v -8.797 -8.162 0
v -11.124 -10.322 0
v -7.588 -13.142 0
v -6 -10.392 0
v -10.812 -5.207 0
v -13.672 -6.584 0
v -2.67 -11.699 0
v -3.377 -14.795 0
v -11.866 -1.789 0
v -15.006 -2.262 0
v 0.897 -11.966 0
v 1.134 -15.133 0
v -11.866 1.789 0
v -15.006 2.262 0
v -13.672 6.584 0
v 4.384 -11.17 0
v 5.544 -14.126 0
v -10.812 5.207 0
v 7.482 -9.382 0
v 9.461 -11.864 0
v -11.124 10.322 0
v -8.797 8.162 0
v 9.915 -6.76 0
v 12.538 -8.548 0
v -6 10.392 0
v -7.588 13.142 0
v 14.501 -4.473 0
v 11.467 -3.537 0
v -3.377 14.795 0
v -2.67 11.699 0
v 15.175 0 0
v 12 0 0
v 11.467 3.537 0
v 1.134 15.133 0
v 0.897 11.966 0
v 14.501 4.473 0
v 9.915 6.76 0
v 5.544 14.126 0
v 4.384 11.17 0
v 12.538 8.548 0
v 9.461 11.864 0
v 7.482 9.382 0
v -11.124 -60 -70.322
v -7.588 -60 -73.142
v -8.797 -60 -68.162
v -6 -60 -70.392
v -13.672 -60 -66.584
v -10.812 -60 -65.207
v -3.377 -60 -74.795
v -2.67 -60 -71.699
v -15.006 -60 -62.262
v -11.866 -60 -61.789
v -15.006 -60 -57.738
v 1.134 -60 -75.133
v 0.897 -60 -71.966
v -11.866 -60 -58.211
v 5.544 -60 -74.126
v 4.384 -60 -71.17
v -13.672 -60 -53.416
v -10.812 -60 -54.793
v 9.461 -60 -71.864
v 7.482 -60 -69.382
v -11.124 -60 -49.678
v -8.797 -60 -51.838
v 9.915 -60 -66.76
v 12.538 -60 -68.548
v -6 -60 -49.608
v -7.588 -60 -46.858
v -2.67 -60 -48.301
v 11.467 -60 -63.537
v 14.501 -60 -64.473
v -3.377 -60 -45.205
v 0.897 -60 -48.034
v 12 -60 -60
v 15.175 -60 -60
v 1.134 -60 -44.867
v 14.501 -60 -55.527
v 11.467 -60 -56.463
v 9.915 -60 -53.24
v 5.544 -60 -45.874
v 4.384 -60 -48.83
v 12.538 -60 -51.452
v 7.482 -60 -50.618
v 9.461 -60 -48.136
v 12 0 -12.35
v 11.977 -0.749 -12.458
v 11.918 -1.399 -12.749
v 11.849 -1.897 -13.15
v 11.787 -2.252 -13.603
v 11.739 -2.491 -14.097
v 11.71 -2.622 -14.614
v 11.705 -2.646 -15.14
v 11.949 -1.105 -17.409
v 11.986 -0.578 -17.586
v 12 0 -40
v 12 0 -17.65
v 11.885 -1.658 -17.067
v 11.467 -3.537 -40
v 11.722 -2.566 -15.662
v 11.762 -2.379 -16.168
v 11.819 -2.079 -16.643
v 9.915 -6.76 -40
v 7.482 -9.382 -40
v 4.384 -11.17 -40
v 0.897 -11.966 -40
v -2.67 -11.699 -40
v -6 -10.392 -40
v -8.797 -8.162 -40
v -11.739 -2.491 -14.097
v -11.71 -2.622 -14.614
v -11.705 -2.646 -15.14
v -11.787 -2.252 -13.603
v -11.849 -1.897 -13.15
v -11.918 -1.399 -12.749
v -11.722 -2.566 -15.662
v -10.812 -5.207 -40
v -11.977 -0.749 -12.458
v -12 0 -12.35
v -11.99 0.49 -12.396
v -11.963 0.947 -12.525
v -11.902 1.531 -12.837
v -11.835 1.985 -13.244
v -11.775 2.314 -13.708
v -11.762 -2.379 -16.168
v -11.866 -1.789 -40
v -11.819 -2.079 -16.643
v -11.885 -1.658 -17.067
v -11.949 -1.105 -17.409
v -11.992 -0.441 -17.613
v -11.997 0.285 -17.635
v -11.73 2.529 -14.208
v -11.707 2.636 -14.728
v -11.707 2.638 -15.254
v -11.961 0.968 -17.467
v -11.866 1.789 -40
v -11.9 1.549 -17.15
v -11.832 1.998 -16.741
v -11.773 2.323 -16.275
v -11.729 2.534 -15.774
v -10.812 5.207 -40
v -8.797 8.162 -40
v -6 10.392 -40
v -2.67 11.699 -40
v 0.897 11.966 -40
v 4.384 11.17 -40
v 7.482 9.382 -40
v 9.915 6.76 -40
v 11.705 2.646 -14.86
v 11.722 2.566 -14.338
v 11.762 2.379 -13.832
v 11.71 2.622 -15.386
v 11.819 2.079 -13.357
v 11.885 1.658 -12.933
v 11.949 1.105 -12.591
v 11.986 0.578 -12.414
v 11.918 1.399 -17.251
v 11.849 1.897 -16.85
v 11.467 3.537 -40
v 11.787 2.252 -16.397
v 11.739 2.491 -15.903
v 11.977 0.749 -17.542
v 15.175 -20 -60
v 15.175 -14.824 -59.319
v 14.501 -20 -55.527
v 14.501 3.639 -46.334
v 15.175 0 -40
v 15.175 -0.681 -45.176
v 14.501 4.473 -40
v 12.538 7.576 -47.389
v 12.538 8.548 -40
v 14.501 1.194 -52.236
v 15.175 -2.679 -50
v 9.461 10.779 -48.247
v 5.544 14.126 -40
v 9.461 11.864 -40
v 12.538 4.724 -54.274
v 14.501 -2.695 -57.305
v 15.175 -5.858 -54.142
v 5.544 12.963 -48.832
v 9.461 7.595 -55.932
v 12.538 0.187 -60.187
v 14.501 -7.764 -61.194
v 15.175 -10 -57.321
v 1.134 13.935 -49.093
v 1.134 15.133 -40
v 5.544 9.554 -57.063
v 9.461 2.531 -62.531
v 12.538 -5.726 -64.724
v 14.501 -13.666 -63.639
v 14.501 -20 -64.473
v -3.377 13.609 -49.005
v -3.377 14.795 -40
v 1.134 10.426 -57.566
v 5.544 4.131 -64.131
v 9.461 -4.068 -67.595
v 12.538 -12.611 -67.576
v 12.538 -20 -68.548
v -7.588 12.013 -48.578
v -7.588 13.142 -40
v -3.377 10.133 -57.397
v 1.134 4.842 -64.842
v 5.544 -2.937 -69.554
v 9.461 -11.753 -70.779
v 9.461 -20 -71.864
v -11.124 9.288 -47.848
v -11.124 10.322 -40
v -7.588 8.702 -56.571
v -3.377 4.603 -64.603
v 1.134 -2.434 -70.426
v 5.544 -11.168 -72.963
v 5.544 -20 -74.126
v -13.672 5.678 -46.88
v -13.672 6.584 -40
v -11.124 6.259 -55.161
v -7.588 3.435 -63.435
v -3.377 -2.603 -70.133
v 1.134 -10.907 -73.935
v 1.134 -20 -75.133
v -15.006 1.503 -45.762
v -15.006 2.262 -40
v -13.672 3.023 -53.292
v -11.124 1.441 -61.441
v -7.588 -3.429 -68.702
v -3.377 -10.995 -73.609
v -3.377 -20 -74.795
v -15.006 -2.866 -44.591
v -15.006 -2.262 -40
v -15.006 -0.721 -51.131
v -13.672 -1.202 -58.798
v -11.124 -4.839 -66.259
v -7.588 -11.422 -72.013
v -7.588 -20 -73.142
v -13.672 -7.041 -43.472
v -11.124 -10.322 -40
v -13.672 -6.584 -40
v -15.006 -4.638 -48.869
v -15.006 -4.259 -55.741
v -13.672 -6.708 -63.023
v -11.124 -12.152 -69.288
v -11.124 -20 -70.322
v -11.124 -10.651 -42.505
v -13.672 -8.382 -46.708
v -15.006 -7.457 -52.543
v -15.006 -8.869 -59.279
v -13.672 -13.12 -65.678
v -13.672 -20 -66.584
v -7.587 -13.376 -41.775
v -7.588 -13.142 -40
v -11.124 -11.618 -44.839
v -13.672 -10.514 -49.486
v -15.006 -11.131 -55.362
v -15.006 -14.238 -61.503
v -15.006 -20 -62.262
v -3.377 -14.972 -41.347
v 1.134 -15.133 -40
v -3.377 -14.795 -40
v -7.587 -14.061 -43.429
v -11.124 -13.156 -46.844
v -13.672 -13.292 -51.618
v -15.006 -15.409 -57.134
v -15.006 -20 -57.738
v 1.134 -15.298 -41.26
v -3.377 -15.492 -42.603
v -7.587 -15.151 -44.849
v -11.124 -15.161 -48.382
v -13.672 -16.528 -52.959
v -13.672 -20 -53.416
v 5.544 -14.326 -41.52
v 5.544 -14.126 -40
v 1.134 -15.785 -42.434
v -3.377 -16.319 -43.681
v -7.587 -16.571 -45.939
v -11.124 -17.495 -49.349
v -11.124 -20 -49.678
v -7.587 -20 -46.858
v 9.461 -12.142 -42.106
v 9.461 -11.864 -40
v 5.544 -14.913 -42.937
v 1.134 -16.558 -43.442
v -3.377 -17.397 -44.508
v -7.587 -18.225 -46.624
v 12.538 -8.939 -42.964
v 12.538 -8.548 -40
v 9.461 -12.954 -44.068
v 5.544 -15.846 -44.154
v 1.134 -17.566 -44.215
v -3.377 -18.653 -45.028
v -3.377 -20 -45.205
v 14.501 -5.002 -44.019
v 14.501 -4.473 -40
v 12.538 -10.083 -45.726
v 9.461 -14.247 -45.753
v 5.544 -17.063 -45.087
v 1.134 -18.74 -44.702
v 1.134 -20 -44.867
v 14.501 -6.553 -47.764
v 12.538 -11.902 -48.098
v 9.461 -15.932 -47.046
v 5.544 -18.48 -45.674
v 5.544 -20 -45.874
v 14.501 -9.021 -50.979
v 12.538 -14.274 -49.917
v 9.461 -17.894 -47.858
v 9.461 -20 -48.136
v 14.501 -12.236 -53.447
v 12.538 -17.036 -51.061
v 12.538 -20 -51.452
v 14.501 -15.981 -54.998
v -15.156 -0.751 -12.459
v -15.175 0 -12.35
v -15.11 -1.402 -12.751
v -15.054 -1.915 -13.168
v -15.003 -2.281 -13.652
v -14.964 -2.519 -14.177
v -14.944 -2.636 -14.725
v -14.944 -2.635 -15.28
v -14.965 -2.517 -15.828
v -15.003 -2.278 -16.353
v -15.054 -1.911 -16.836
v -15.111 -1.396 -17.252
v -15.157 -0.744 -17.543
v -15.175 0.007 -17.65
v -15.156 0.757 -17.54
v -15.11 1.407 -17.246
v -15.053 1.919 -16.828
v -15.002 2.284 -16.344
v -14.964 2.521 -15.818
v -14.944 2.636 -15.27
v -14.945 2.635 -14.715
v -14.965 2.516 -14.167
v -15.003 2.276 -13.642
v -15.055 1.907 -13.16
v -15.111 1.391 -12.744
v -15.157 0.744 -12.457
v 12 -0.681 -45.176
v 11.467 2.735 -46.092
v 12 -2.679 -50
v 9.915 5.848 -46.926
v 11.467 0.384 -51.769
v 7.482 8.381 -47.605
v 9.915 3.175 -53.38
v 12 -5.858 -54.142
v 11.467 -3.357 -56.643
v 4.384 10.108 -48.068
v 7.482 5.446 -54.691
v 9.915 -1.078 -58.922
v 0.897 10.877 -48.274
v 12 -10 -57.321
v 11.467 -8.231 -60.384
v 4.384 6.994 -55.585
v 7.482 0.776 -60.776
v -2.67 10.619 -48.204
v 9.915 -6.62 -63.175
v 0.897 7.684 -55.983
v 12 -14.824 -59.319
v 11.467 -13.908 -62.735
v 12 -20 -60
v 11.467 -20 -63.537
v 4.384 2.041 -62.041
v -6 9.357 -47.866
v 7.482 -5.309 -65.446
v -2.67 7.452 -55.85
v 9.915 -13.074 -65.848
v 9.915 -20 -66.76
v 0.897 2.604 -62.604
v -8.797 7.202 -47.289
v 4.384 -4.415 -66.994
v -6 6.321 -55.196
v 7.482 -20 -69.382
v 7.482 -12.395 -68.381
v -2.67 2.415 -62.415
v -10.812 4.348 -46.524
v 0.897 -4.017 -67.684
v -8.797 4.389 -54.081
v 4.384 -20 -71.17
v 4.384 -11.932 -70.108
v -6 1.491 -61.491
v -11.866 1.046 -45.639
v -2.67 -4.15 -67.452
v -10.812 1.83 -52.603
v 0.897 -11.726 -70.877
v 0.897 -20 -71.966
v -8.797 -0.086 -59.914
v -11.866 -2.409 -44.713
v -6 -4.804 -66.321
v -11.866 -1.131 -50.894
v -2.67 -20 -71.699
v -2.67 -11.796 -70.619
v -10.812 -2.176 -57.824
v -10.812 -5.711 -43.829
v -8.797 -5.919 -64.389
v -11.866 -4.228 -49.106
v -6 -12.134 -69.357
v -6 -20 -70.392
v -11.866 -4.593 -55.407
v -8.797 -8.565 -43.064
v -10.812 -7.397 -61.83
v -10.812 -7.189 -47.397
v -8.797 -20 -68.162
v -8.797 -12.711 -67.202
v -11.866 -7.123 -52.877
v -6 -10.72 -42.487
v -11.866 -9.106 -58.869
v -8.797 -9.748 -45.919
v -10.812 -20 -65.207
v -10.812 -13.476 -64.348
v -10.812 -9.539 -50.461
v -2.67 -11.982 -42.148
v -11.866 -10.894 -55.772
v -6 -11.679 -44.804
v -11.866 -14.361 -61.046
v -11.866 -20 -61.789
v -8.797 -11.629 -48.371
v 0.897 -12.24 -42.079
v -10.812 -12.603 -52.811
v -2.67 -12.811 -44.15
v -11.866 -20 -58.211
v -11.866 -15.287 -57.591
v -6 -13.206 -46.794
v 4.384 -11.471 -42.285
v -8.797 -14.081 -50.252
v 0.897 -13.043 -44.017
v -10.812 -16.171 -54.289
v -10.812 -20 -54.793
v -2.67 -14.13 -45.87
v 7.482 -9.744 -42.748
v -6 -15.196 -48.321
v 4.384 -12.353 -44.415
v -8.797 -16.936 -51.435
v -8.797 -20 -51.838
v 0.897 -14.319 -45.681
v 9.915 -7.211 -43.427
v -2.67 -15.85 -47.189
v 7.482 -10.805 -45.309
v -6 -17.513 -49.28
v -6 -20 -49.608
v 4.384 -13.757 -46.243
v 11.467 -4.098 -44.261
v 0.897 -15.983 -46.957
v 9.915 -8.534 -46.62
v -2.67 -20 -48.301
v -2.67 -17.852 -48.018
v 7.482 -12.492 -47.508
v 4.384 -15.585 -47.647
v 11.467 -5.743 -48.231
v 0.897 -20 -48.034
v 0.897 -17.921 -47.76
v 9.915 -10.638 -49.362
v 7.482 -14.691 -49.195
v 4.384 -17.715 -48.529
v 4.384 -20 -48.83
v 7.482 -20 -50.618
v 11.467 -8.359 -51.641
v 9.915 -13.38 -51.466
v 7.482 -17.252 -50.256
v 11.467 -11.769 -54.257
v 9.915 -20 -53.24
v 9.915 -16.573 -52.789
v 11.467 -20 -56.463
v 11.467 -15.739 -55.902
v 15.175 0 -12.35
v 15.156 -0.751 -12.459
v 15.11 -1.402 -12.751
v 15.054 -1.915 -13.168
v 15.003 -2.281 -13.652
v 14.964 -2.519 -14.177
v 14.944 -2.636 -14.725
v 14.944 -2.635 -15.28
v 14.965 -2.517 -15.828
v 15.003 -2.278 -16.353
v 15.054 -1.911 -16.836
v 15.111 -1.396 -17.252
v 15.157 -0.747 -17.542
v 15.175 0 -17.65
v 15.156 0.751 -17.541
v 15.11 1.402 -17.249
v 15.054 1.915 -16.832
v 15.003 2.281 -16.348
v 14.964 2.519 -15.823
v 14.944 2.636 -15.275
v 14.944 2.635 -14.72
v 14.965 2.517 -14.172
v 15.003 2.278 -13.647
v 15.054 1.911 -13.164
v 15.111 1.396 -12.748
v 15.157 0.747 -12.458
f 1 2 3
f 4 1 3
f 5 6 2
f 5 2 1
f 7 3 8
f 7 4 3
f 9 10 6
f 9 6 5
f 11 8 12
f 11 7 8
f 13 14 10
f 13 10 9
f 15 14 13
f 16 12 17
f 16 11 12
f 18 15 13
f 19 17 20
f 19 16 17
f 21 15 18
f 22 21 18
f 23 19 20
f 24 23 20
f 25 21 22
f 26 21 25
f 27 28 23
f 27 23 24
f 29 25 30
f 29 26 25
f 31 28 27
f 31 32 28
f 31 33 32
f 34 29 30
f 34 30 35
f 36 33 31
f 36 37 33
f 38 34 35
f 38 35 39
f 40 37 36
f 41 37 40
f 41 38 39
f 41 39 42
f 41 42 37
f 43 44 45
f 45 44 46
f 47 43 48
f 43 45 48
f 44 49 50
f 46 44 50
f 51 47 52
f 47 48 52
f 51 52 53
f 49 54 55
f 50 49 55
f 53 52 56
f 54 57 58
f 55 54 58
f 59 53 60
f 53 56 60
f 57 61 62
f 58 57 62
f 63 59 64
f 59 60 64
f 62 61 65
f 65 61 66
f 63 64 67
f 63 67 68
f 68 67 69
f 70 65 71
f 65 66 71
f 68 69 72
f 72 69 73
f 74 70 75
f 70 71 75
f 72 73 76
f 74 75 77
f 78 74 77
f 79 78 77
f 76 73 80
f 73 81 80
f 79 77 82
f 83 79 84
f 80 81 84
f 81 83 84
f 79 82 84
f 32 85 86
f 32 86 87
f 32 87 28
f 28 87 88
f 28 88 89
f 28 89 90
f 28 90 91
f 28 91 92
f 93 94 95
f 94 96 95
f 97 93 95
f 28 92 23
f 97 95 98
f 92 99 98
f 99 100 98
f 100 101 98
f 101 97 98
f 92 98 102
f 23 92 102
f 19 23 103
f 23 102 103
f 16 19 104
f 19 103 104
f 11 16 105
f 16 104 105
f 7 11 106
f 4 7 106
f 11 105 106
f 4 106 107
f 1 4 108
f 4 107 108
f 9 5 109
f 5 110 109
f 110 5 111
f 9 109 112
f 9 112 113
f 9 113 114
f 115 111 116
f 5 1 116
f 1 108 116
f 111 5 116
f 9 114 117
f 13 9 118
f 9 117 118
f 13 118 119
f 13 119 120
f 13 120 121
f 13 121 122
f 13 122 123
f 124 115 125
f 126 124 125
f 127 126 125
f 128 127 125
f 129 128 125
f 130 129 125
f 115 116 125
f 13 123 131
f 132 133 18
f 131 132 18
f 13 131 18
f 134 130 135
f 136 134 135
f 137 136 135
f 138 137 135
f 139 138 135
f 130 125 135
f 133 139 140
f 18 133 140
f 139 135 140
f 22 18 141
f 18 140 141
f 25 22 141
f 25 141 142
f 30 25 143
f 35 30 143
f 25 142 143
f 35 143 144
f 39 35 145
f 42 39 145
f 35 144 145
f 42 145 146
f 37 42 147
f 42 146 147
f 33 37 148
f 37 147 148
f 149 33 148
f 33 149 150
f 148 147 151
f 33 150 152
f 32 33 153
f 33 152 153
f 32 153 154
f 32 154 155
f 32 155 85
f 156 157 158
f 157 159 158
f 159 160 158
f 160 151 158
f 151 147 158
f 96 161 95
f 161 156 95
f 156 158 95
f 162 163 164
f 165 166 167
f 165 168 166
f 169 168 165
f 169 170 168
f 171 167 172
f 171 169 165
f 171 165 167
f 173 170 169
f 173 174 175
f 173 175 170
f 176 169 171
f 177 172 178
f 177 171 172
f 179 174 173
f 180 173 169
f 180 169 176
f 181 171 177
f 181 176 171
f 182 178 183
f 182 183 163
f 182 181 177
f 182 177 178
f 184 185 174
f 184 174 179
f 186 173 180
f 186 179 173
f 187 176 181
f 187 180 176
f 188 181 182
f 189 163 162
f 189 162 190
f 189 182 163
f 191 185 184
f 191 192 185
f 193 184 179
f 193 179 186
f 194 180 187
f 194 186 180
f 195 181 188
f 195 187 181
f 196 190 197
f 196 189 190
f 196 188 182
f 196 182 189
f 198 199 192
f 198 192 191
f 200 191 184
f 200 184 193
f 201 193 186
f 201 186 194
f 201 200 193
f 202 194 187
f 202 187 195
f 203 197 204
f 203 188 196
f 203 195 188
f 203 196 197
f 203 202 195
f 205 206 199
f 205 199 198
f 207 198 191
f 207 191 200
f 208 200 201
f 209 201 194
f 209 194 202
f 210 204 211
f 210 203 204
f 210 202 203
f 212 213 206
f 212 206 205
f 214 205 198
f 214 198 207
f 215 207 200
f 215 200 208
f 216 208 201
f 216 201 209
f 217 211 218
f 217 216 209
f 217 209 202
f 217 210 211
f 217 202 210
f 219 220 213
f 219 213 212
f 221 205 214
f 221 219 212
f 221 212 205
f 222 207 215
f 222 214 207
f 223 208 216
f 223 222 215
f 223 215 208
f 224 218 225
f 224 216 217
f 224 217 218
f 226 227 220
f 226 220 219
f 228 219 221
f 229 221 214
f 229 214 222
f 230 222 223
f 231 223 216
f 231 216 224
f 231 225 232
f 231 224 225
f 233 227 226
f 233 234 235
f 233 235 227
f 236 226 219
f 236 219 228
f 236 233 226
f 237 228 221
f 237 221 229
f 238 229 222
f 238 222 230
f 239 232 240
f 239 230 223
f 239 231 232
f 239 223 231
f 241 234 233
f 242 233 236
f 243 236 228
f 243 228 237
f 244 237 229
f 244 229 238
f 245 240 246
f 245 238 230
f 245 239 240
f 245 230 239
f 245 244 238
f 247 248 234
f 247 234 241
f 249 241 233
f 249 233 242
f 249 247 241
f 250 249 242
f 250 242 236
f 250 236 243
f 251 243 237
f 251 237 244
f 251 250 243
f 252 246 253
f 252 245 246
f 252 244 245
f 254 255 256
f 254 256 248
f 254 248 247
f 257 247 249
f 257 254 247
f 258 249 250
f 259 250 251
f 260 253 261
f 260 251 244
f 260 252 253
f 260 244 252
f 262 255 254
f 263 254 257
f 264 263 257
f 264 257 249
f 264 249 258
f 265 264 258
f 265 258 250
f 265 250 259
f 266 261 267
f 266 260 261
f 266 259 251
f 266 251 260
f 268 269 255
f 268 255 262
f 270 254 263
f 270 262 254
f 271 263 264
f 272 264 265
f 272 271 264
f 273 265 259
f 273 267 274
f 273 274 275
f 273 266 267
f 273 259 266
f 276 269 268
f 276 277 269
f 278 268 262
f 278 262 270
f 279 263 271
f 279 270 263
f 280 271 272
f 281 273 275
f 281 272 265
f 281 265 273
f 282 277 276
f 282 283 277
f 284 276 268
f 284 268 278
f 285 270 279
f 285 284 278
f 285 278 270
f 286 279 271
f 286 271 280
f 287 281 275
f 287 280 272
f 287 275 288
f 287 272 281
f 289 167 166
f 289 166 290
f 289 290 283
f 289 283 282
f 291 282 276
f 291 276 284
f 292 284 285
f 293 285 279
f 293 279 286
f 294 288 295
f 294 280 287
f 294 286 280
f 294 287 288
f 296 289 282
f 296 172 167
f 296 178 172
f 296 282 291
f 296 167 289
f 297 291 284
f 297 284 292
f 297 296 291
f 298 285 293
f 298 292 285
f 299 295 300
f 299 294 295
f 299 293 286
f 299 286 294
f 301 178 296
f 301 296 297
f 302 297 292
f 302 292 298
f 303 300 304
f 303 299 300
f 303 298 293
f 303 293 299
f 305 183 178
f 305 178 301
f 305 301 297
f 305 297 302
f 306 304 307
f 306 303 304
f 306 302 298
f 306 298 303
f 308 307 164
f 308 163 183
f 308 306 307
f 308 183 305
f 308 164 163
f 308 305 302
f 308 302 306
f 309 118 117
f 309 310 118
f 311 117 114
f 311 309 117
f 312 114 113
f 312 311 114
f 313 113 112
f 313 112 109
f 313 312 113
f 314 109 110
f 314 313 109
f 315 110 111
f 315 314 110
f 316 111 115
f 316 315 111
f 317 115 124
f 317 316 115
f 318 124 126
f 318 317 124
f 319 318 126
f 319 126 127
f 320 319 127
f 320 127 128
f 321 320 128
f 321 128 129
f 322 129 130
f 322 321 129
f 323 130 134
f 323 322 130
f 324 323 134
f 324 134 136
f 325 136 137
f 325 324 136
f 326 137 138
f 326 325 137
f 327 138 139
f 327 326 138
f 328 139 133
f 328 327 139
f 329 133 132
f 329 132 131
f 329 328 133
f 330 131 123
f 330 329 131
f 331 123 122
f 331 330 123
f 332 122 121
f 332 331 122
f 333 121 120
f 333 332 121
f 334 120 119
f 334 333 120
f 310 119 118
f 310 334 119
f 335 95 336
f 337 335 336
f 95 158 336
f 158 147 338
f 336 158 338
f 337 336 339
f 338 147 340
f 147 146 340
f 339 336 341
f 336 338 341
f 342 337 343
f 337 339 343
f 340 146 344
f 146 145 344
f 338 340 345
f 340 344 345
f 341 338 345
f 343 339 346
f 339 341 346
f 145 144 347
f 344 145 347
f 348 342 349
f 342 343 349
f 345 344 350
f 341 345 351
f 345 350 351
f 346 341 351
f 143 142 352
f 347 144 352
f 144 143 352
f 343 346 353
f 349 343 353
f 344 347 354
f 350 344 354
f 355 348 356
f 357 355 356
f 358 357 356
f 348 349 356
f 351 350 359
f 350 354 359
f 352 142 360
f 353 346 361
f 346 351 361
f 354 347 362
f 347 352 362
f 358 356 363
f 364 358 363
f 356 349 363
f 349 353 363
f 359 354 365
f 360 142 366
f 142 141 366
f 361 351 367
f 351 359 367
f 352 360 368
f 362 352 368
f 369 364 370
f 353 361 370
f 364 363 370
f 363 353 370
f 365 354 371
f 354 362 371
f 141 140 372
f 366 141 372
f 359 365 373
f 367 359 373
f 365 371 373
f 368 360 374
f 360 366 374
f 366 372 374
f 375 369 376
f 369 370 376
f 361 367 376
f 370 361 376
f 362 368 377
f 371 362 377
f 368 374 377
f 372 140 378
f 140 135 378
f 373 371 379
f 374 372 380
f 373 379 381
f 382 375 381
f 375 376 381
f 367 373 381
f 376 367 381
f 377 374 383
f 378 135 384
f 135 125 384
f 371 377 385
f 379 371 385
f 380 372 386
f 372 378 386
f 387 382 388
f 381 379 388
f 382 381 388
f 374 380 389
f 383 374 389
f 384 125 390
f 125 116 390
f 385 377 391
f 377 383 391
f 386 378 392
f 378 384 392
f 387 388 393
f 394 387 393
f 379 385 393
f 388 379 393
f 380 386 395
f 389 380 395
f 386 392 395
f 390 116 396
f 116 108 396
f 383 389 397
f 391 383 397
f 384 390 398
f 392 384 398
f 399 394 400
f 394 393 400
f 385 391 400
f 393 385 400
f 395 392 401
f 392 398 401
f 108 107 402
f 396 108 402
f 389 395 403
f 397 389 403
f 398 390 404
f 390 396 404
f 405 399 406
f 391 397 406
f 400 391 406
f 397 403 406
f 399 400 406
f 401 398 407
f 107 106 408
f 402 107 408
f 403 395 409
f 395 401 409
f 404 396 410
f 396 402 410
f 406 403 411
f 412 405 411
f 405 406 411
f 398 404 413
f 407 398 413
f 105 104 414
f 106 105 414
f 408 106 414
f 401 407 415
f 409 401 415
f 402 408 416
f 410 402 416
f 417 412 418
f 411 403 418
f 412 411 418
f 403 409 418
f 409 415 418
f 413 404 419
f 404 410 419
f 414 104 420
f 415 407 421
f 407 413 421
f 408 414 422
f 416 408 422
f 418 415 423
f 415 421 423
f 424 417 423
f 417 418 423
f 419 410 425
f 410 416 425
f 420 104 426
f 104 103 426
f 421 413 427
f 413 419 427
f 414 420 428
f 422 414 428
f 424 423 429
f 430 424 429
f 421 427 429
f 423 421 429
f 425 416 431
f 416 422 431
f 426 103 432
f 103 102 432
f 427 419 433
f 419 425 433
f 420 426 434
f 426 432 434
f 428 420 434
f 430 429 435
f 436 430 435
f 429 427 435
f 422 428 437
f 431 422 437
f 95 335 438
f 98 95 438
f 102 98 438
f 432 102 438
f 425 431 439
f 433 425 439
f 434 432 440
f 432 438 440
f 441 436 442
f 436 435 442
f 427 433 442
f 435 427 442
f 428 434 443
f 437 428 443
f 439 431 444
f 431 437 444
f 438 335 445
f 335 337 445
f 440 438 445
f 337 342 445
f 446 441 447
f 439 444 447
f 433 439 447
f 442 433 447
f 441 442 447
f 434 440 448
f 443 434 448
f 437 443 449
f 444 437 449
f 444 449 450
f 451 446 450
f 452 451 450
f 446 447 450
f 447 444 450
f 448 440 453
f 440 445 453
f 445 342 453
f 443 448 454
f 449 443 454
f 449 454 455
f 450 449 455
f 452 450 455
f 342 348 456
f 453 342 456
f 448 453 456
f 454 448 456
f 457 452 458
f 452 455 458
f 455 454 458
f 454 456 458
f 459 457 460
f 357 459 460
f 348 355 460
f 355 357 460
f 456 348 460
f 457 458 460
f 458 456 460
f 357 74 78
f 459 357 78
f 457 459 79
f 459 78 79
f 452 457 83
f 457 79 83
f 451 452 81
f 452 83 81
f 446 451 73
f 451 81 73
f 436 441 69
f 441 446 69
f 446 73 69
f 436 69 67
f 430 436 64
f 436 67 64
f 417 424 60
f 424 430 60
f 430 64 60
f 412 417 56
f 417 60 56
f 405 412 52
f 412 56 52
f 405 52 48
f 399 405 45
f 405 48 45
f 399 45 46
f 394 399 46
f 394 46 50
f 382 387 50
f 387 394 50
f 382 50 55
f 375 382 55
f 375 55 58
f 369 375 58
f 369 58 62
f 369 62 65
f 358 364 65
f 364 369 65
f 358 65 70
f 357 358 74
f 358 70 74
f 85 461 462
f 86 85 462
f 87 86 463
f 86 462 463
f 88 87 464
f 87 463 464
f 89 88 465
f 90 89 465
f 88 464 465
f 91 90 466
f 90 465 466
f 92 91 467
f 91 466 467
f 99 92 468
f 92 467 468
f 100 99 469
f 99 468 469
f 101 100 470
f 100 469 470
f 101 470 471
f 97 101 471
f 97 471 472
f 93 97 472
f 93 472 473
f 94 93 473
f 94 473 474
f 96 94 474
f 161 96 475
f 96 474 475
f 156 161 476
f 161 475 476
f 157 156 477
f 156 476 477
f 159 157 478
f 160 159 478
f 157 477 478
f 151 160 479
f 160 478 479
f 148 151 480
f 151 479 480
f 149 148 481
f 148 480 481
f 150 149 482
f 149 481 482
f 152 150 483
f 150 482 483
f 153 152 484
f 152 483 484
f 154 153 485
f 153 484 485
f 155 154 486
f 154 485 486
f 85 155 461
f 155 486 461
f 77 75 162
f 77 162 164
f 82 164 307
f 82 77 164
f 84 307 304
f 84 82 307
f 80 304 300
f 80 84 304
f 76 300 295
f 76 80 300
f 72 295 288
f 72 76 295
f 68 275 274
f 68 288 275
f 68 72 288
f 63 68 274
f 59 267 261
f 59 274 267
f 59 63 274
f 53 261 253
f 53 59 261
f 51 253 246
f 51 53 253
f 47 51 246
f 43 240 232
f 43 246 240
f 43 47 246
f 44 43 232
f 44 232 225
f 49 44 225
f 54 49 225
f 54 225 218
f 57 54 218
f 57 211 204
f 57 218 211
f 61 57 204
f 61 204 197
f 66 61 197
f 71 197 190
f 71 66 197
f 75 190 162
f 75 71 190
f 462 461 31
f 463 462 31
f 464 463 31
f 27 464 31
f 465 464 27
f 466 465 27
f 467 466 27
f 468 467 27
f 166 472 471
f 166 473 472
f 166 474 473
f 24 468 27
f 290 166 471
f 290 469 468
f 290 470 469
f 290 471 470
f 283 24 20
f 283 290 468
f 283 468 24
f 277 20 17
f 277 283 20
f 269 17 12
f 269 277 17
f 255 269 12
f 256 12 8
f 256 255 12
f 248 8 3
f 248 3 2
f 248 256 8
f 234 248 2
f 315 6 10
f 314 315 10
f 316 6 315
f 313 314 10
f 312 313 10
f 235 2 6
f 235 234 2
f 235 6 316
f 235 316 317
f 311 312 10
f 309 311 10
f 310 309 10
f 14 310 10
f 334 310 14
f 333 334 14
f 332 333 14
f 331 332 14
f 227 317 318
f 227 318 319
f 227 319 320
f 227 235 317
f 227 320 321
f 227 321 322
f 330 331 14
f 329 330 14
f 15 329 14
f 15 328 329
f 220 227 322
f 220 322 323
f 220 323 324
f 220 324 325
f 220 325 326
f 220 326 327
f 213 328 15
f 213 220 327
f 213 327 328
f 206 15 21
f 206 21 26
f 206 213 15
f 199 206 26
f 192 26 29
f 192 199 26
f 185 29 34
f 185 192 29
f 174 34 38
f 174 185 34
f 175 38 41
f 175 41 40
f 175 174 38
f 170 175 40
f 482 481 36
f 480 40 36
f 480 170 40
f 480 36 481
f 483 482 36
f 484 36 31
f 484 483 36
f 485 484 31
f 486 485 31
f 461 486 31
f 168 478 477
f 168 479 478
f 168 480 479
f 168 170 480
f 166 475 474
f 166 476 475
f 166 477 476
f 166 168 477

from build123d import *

# Parameters (mm, degrees)
SKETCH1_R   = 15.175
SKETCH1_R_2 = 12
SKETCH6_W   = 2.65
SKETCH6_H   = 15.175


with BuildPart() as part:
    # Sweep1: sweep along a path in Sketch3
    with BuildLine(Plane(origin=(0, 0, 0), x_dir=(0, 0, -1), z_dir=(1, 0, 0))) as sweep1_path:
        Line((0, 0), (40, 0))
        ThreePointArc((40, 0), (54.142135624, -5.857864376), (60, -20))
        Line((60, -20), (60, -60))
    # Sketch1 → Sweep1 (sweep)
    with BuildSketch(Plane.XY):
        Circle(SKETCH1_R)
        Circle(SKETCH1_R_2, mode=Mode.SUBTRACT)
    sweep(path=sweep1_path.line)

    # Sketch6 → M5 Clearance Hole1 (revolve, cut)
    with BuildSketch(Plane(origin=(0, 0, -15), x_dir=(0, 0, 1), z_dir=(0, 1, 0))):
        with Locations((1.325, 7.5875)):
            Rectangle(SKETCH6_W, SKETCH6_H)
    m5_clearance_hole1 = revolve(axis=Axis((-6.35, 0, -15), (1, 0, 0)), mode=Mode.SUBTRACT)

    # Mirror1: M5 Clearance Hole1 across plane
    add(m5_clearance_hole1.mirror(Plane(origin=(0, 0, 0), x_dir=(0, 0, 1), z_dir=(1, 0, 0))), mode=Mode.SUBTRACT)


solid = part.part
